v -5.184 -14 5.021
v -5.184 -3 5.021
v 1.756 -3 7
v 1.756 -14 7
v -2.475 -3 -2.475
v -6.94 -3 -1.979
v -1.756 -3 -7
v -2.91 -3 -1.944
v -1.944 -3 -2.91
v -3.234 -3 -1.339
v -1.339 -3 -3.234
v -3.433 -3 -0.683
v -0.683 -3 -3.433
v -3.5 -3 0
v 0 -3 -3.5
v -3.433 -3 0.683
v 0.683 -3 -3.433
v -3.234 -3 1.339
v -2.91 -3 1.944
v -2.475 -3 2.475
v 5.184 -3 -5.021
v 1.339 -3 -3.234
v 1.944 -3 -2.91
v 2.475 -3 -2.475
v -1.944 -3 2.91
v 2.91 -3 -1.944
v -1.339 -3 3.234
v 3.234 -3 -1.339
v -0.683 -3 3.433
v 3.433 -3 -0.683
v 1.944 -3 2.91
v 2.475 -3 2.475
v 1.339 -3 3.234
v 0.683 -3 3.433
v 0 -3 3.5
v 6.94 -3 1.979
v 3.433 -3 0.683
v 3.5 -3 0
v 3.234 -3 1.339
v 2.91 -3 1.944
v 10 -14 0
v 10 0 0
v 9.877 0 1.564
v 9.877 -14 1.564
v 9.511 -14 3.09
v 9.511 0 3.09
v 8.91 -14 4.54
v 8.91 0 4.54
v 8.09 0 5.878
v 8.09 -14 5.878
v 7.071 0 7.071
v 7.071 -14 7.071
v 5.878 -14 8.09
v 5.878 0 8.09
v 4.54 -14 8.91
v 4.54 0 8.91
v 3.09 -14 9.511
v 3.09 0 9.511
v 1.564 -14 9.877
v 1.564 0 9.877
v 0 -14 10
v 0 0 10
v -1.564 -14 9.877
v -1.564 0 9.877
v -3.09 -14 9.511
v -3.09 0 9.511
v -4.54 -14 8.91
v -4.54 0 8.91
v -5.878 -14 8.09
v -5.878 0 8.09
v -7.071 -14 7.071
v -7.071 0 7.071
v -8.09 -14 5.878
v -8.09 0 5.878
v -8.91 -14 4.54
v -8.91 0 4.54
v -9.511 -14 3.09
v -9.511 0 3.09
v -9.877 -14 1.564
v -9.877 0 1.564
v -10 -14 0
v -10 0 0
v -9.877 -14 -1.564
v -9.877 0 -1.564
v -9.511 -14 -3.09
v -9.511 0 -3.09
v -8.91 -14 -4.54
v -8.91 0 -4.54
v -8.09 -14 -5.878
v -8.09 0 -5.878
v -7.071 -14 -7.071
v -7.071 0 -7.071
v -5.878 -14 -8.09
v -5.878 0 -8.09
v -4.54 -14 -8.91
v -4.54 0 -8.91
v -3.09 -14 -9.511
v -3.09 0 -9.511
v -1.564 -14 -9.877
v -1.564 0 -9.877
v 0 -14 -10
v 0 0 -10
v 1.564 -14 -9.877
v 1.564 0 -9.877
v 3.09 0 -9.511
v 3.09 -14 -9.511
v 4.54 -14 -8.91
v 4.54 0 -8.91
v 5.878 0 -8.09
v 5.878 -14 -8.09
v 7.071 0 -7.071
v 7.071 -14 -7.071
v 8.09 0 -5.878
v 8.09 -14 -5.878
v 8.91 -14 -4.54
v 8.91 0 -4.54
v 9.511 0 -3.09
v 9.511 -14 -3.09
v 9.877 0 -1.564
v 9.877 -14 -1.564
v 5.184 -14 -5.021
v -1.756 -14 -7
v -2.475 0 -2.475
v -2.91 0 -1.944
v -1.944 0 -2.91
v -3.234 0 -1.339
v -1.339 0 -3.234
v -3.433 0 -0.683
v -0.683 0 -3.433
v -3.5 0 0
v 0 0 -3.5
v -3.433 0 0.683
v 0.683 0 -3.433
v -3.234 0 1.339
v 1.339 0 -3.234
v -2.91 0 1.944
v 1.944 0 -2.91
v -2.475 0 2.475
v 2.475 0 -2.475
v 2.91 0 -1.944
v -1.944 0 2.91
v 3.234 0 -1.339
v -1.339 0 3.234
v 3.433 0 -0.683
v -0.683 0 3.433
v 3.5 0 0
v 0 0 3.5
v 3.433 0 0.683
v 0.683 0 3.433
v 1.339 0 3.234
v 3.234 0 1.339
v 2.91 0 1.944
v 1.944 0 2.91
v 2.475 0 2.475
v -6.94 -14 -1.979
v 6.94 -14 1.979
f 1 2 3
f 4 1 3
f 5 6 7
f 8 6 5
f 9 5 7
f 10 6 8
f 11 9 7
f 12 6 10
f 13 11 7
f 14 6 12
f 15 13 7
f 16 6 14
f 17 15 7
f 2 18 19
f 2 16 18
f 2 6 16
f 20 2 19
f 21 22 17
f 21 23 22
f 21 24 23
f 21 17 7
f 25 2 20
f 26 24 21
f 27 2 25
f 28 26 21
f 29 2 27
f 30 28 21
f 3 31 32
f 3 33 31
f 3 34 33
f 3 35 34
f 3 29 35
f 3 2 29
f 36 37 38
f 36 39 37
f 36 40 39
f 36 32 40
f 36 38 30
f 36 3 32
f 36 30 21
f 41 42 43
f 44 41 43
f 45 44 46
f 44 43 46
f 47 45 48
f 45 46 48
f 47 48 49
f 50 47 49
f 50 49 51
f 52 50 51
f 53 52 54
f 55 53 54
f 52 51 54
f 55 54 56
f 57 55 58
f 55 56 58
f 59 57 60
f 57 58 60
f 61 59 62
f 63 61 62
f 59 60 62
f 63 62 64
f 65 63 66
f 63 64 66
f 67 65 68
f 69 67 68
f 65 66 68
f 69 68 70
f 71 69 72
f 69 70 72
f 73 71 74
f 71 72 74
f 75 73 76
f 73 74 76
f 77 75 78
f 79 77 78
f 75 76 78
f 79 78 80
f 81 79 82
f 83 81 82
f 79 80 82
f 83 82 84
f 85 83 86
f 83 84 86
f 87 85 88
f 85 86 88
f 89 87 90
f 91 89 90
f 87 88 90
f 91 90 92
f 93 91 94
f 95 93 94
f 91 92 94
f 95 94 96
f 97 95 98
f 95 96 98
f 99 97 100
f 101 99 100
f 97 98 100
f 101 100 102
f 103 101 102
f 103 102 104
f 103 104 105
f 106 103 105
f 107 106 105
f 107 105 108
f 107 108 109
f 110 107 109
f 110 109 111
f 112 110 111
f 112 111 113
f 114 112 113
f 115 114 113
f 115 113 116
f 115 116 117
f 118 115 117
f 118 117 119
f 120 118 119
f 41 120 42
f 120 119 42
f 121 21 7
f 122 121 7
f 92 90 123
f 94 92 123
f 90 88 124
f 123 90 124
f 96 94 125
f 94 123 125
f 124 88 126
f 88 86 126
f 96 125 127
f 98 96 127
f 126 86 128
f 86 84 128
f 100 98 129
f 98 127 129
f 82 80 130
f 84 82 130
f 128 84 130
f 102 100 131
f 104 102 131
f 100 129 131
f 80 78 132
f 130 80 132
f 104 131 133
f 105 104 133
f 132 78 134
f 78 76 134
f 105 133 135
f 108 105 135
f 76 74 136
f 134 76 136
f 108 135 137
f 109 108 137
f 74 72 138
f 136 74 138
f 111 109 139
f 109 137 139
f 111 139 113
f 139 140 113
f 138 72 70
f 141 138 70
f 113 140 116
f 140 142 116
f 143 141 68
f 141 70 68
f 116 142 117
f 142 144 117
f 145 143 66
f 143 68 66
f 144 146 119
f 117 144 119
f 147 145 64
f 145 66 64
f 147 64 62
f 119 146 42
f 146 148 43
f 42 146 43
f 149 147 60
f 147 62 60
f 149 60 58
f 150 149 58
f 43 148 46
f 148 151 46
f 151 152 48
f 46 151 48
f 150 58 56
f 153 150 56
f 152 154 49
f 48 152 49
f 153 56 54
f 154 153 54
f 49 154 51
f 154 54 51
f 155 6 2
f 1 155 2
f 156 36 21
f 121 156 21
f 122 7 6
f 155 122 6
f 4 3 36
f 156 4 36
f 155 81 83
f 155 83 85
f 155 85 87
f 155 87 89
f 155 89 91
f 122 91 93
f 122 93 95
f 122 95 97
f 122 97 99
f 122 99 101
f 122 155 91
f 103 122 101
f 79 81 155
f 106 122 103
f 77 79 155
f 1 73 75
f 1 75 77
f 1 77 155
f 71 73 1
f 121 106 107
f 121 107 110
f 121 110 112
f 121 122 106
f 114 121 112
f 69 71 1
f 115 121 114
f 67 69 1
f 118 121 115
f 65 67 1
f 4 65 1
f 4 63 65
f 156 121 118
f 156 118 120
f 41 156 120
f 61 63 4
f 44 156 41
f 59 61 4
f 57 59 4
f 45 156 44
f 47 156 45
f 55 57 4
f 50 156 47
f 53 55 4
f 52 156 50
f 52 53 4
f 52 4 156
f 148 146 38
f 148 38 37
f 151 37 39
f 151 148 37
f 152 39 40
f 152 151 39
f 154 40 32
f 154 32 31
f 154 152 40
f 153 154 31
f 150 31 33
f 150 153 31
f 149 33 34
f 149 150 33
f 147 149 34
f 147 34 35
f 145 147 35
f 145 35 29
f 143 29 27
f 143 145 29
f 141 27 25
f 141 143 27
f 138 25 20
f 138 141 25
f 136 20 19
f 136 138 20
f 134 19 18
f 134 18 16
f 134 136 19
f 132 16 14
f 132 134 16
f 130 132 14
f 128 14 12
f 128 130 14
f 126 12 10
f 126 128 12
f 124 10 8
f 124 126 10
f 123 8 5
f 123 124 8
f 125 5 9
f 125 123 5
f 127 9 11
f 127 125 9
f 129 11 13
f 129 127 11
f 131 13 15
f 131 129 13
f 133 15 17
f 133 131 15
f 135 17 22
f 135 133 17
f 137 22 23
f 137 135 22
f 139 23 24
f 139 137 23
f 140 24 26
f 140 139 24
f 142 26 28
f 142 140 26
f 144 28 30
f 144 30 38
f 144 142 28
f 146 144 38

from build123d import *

# Parameters (mm, degrees)
F0_R     = 10
F1_DEPTH = 14
F0_R_2   = 3.5
F2_DEPTH = 3


with BuildPart() as f1:
    # F0 (on Front) → F1 (new body)
    with BuildSketch(Plane.XZ):
        Circle(F0_R)
        Polygon((-5.184207, 5.020691), (1.755942, 7), (6.940149, 1.979309), (5.184207, -5.020691), (-1.755942, -7), (-6.940149, -1.979309), align=None, mode=Mode.SUBTRACT)
    extrude(amount=F1_DEPTH)

    # F0 (on Front) → F2 (join)
    with BuildSketch(Plane.XZ):
        Polygon((6.940149, 1.979309), (1.755942, 7), (-5.184207, 5.020691), (-6.940149, -1.979309), (-1.755942, -7), (5.184207, -5.020691), align=None)
        Circle(F0_R_2, mode=Mode.SUBTRACT)
    extrude(amount=F2_DEPTH)


solid = f1.part
